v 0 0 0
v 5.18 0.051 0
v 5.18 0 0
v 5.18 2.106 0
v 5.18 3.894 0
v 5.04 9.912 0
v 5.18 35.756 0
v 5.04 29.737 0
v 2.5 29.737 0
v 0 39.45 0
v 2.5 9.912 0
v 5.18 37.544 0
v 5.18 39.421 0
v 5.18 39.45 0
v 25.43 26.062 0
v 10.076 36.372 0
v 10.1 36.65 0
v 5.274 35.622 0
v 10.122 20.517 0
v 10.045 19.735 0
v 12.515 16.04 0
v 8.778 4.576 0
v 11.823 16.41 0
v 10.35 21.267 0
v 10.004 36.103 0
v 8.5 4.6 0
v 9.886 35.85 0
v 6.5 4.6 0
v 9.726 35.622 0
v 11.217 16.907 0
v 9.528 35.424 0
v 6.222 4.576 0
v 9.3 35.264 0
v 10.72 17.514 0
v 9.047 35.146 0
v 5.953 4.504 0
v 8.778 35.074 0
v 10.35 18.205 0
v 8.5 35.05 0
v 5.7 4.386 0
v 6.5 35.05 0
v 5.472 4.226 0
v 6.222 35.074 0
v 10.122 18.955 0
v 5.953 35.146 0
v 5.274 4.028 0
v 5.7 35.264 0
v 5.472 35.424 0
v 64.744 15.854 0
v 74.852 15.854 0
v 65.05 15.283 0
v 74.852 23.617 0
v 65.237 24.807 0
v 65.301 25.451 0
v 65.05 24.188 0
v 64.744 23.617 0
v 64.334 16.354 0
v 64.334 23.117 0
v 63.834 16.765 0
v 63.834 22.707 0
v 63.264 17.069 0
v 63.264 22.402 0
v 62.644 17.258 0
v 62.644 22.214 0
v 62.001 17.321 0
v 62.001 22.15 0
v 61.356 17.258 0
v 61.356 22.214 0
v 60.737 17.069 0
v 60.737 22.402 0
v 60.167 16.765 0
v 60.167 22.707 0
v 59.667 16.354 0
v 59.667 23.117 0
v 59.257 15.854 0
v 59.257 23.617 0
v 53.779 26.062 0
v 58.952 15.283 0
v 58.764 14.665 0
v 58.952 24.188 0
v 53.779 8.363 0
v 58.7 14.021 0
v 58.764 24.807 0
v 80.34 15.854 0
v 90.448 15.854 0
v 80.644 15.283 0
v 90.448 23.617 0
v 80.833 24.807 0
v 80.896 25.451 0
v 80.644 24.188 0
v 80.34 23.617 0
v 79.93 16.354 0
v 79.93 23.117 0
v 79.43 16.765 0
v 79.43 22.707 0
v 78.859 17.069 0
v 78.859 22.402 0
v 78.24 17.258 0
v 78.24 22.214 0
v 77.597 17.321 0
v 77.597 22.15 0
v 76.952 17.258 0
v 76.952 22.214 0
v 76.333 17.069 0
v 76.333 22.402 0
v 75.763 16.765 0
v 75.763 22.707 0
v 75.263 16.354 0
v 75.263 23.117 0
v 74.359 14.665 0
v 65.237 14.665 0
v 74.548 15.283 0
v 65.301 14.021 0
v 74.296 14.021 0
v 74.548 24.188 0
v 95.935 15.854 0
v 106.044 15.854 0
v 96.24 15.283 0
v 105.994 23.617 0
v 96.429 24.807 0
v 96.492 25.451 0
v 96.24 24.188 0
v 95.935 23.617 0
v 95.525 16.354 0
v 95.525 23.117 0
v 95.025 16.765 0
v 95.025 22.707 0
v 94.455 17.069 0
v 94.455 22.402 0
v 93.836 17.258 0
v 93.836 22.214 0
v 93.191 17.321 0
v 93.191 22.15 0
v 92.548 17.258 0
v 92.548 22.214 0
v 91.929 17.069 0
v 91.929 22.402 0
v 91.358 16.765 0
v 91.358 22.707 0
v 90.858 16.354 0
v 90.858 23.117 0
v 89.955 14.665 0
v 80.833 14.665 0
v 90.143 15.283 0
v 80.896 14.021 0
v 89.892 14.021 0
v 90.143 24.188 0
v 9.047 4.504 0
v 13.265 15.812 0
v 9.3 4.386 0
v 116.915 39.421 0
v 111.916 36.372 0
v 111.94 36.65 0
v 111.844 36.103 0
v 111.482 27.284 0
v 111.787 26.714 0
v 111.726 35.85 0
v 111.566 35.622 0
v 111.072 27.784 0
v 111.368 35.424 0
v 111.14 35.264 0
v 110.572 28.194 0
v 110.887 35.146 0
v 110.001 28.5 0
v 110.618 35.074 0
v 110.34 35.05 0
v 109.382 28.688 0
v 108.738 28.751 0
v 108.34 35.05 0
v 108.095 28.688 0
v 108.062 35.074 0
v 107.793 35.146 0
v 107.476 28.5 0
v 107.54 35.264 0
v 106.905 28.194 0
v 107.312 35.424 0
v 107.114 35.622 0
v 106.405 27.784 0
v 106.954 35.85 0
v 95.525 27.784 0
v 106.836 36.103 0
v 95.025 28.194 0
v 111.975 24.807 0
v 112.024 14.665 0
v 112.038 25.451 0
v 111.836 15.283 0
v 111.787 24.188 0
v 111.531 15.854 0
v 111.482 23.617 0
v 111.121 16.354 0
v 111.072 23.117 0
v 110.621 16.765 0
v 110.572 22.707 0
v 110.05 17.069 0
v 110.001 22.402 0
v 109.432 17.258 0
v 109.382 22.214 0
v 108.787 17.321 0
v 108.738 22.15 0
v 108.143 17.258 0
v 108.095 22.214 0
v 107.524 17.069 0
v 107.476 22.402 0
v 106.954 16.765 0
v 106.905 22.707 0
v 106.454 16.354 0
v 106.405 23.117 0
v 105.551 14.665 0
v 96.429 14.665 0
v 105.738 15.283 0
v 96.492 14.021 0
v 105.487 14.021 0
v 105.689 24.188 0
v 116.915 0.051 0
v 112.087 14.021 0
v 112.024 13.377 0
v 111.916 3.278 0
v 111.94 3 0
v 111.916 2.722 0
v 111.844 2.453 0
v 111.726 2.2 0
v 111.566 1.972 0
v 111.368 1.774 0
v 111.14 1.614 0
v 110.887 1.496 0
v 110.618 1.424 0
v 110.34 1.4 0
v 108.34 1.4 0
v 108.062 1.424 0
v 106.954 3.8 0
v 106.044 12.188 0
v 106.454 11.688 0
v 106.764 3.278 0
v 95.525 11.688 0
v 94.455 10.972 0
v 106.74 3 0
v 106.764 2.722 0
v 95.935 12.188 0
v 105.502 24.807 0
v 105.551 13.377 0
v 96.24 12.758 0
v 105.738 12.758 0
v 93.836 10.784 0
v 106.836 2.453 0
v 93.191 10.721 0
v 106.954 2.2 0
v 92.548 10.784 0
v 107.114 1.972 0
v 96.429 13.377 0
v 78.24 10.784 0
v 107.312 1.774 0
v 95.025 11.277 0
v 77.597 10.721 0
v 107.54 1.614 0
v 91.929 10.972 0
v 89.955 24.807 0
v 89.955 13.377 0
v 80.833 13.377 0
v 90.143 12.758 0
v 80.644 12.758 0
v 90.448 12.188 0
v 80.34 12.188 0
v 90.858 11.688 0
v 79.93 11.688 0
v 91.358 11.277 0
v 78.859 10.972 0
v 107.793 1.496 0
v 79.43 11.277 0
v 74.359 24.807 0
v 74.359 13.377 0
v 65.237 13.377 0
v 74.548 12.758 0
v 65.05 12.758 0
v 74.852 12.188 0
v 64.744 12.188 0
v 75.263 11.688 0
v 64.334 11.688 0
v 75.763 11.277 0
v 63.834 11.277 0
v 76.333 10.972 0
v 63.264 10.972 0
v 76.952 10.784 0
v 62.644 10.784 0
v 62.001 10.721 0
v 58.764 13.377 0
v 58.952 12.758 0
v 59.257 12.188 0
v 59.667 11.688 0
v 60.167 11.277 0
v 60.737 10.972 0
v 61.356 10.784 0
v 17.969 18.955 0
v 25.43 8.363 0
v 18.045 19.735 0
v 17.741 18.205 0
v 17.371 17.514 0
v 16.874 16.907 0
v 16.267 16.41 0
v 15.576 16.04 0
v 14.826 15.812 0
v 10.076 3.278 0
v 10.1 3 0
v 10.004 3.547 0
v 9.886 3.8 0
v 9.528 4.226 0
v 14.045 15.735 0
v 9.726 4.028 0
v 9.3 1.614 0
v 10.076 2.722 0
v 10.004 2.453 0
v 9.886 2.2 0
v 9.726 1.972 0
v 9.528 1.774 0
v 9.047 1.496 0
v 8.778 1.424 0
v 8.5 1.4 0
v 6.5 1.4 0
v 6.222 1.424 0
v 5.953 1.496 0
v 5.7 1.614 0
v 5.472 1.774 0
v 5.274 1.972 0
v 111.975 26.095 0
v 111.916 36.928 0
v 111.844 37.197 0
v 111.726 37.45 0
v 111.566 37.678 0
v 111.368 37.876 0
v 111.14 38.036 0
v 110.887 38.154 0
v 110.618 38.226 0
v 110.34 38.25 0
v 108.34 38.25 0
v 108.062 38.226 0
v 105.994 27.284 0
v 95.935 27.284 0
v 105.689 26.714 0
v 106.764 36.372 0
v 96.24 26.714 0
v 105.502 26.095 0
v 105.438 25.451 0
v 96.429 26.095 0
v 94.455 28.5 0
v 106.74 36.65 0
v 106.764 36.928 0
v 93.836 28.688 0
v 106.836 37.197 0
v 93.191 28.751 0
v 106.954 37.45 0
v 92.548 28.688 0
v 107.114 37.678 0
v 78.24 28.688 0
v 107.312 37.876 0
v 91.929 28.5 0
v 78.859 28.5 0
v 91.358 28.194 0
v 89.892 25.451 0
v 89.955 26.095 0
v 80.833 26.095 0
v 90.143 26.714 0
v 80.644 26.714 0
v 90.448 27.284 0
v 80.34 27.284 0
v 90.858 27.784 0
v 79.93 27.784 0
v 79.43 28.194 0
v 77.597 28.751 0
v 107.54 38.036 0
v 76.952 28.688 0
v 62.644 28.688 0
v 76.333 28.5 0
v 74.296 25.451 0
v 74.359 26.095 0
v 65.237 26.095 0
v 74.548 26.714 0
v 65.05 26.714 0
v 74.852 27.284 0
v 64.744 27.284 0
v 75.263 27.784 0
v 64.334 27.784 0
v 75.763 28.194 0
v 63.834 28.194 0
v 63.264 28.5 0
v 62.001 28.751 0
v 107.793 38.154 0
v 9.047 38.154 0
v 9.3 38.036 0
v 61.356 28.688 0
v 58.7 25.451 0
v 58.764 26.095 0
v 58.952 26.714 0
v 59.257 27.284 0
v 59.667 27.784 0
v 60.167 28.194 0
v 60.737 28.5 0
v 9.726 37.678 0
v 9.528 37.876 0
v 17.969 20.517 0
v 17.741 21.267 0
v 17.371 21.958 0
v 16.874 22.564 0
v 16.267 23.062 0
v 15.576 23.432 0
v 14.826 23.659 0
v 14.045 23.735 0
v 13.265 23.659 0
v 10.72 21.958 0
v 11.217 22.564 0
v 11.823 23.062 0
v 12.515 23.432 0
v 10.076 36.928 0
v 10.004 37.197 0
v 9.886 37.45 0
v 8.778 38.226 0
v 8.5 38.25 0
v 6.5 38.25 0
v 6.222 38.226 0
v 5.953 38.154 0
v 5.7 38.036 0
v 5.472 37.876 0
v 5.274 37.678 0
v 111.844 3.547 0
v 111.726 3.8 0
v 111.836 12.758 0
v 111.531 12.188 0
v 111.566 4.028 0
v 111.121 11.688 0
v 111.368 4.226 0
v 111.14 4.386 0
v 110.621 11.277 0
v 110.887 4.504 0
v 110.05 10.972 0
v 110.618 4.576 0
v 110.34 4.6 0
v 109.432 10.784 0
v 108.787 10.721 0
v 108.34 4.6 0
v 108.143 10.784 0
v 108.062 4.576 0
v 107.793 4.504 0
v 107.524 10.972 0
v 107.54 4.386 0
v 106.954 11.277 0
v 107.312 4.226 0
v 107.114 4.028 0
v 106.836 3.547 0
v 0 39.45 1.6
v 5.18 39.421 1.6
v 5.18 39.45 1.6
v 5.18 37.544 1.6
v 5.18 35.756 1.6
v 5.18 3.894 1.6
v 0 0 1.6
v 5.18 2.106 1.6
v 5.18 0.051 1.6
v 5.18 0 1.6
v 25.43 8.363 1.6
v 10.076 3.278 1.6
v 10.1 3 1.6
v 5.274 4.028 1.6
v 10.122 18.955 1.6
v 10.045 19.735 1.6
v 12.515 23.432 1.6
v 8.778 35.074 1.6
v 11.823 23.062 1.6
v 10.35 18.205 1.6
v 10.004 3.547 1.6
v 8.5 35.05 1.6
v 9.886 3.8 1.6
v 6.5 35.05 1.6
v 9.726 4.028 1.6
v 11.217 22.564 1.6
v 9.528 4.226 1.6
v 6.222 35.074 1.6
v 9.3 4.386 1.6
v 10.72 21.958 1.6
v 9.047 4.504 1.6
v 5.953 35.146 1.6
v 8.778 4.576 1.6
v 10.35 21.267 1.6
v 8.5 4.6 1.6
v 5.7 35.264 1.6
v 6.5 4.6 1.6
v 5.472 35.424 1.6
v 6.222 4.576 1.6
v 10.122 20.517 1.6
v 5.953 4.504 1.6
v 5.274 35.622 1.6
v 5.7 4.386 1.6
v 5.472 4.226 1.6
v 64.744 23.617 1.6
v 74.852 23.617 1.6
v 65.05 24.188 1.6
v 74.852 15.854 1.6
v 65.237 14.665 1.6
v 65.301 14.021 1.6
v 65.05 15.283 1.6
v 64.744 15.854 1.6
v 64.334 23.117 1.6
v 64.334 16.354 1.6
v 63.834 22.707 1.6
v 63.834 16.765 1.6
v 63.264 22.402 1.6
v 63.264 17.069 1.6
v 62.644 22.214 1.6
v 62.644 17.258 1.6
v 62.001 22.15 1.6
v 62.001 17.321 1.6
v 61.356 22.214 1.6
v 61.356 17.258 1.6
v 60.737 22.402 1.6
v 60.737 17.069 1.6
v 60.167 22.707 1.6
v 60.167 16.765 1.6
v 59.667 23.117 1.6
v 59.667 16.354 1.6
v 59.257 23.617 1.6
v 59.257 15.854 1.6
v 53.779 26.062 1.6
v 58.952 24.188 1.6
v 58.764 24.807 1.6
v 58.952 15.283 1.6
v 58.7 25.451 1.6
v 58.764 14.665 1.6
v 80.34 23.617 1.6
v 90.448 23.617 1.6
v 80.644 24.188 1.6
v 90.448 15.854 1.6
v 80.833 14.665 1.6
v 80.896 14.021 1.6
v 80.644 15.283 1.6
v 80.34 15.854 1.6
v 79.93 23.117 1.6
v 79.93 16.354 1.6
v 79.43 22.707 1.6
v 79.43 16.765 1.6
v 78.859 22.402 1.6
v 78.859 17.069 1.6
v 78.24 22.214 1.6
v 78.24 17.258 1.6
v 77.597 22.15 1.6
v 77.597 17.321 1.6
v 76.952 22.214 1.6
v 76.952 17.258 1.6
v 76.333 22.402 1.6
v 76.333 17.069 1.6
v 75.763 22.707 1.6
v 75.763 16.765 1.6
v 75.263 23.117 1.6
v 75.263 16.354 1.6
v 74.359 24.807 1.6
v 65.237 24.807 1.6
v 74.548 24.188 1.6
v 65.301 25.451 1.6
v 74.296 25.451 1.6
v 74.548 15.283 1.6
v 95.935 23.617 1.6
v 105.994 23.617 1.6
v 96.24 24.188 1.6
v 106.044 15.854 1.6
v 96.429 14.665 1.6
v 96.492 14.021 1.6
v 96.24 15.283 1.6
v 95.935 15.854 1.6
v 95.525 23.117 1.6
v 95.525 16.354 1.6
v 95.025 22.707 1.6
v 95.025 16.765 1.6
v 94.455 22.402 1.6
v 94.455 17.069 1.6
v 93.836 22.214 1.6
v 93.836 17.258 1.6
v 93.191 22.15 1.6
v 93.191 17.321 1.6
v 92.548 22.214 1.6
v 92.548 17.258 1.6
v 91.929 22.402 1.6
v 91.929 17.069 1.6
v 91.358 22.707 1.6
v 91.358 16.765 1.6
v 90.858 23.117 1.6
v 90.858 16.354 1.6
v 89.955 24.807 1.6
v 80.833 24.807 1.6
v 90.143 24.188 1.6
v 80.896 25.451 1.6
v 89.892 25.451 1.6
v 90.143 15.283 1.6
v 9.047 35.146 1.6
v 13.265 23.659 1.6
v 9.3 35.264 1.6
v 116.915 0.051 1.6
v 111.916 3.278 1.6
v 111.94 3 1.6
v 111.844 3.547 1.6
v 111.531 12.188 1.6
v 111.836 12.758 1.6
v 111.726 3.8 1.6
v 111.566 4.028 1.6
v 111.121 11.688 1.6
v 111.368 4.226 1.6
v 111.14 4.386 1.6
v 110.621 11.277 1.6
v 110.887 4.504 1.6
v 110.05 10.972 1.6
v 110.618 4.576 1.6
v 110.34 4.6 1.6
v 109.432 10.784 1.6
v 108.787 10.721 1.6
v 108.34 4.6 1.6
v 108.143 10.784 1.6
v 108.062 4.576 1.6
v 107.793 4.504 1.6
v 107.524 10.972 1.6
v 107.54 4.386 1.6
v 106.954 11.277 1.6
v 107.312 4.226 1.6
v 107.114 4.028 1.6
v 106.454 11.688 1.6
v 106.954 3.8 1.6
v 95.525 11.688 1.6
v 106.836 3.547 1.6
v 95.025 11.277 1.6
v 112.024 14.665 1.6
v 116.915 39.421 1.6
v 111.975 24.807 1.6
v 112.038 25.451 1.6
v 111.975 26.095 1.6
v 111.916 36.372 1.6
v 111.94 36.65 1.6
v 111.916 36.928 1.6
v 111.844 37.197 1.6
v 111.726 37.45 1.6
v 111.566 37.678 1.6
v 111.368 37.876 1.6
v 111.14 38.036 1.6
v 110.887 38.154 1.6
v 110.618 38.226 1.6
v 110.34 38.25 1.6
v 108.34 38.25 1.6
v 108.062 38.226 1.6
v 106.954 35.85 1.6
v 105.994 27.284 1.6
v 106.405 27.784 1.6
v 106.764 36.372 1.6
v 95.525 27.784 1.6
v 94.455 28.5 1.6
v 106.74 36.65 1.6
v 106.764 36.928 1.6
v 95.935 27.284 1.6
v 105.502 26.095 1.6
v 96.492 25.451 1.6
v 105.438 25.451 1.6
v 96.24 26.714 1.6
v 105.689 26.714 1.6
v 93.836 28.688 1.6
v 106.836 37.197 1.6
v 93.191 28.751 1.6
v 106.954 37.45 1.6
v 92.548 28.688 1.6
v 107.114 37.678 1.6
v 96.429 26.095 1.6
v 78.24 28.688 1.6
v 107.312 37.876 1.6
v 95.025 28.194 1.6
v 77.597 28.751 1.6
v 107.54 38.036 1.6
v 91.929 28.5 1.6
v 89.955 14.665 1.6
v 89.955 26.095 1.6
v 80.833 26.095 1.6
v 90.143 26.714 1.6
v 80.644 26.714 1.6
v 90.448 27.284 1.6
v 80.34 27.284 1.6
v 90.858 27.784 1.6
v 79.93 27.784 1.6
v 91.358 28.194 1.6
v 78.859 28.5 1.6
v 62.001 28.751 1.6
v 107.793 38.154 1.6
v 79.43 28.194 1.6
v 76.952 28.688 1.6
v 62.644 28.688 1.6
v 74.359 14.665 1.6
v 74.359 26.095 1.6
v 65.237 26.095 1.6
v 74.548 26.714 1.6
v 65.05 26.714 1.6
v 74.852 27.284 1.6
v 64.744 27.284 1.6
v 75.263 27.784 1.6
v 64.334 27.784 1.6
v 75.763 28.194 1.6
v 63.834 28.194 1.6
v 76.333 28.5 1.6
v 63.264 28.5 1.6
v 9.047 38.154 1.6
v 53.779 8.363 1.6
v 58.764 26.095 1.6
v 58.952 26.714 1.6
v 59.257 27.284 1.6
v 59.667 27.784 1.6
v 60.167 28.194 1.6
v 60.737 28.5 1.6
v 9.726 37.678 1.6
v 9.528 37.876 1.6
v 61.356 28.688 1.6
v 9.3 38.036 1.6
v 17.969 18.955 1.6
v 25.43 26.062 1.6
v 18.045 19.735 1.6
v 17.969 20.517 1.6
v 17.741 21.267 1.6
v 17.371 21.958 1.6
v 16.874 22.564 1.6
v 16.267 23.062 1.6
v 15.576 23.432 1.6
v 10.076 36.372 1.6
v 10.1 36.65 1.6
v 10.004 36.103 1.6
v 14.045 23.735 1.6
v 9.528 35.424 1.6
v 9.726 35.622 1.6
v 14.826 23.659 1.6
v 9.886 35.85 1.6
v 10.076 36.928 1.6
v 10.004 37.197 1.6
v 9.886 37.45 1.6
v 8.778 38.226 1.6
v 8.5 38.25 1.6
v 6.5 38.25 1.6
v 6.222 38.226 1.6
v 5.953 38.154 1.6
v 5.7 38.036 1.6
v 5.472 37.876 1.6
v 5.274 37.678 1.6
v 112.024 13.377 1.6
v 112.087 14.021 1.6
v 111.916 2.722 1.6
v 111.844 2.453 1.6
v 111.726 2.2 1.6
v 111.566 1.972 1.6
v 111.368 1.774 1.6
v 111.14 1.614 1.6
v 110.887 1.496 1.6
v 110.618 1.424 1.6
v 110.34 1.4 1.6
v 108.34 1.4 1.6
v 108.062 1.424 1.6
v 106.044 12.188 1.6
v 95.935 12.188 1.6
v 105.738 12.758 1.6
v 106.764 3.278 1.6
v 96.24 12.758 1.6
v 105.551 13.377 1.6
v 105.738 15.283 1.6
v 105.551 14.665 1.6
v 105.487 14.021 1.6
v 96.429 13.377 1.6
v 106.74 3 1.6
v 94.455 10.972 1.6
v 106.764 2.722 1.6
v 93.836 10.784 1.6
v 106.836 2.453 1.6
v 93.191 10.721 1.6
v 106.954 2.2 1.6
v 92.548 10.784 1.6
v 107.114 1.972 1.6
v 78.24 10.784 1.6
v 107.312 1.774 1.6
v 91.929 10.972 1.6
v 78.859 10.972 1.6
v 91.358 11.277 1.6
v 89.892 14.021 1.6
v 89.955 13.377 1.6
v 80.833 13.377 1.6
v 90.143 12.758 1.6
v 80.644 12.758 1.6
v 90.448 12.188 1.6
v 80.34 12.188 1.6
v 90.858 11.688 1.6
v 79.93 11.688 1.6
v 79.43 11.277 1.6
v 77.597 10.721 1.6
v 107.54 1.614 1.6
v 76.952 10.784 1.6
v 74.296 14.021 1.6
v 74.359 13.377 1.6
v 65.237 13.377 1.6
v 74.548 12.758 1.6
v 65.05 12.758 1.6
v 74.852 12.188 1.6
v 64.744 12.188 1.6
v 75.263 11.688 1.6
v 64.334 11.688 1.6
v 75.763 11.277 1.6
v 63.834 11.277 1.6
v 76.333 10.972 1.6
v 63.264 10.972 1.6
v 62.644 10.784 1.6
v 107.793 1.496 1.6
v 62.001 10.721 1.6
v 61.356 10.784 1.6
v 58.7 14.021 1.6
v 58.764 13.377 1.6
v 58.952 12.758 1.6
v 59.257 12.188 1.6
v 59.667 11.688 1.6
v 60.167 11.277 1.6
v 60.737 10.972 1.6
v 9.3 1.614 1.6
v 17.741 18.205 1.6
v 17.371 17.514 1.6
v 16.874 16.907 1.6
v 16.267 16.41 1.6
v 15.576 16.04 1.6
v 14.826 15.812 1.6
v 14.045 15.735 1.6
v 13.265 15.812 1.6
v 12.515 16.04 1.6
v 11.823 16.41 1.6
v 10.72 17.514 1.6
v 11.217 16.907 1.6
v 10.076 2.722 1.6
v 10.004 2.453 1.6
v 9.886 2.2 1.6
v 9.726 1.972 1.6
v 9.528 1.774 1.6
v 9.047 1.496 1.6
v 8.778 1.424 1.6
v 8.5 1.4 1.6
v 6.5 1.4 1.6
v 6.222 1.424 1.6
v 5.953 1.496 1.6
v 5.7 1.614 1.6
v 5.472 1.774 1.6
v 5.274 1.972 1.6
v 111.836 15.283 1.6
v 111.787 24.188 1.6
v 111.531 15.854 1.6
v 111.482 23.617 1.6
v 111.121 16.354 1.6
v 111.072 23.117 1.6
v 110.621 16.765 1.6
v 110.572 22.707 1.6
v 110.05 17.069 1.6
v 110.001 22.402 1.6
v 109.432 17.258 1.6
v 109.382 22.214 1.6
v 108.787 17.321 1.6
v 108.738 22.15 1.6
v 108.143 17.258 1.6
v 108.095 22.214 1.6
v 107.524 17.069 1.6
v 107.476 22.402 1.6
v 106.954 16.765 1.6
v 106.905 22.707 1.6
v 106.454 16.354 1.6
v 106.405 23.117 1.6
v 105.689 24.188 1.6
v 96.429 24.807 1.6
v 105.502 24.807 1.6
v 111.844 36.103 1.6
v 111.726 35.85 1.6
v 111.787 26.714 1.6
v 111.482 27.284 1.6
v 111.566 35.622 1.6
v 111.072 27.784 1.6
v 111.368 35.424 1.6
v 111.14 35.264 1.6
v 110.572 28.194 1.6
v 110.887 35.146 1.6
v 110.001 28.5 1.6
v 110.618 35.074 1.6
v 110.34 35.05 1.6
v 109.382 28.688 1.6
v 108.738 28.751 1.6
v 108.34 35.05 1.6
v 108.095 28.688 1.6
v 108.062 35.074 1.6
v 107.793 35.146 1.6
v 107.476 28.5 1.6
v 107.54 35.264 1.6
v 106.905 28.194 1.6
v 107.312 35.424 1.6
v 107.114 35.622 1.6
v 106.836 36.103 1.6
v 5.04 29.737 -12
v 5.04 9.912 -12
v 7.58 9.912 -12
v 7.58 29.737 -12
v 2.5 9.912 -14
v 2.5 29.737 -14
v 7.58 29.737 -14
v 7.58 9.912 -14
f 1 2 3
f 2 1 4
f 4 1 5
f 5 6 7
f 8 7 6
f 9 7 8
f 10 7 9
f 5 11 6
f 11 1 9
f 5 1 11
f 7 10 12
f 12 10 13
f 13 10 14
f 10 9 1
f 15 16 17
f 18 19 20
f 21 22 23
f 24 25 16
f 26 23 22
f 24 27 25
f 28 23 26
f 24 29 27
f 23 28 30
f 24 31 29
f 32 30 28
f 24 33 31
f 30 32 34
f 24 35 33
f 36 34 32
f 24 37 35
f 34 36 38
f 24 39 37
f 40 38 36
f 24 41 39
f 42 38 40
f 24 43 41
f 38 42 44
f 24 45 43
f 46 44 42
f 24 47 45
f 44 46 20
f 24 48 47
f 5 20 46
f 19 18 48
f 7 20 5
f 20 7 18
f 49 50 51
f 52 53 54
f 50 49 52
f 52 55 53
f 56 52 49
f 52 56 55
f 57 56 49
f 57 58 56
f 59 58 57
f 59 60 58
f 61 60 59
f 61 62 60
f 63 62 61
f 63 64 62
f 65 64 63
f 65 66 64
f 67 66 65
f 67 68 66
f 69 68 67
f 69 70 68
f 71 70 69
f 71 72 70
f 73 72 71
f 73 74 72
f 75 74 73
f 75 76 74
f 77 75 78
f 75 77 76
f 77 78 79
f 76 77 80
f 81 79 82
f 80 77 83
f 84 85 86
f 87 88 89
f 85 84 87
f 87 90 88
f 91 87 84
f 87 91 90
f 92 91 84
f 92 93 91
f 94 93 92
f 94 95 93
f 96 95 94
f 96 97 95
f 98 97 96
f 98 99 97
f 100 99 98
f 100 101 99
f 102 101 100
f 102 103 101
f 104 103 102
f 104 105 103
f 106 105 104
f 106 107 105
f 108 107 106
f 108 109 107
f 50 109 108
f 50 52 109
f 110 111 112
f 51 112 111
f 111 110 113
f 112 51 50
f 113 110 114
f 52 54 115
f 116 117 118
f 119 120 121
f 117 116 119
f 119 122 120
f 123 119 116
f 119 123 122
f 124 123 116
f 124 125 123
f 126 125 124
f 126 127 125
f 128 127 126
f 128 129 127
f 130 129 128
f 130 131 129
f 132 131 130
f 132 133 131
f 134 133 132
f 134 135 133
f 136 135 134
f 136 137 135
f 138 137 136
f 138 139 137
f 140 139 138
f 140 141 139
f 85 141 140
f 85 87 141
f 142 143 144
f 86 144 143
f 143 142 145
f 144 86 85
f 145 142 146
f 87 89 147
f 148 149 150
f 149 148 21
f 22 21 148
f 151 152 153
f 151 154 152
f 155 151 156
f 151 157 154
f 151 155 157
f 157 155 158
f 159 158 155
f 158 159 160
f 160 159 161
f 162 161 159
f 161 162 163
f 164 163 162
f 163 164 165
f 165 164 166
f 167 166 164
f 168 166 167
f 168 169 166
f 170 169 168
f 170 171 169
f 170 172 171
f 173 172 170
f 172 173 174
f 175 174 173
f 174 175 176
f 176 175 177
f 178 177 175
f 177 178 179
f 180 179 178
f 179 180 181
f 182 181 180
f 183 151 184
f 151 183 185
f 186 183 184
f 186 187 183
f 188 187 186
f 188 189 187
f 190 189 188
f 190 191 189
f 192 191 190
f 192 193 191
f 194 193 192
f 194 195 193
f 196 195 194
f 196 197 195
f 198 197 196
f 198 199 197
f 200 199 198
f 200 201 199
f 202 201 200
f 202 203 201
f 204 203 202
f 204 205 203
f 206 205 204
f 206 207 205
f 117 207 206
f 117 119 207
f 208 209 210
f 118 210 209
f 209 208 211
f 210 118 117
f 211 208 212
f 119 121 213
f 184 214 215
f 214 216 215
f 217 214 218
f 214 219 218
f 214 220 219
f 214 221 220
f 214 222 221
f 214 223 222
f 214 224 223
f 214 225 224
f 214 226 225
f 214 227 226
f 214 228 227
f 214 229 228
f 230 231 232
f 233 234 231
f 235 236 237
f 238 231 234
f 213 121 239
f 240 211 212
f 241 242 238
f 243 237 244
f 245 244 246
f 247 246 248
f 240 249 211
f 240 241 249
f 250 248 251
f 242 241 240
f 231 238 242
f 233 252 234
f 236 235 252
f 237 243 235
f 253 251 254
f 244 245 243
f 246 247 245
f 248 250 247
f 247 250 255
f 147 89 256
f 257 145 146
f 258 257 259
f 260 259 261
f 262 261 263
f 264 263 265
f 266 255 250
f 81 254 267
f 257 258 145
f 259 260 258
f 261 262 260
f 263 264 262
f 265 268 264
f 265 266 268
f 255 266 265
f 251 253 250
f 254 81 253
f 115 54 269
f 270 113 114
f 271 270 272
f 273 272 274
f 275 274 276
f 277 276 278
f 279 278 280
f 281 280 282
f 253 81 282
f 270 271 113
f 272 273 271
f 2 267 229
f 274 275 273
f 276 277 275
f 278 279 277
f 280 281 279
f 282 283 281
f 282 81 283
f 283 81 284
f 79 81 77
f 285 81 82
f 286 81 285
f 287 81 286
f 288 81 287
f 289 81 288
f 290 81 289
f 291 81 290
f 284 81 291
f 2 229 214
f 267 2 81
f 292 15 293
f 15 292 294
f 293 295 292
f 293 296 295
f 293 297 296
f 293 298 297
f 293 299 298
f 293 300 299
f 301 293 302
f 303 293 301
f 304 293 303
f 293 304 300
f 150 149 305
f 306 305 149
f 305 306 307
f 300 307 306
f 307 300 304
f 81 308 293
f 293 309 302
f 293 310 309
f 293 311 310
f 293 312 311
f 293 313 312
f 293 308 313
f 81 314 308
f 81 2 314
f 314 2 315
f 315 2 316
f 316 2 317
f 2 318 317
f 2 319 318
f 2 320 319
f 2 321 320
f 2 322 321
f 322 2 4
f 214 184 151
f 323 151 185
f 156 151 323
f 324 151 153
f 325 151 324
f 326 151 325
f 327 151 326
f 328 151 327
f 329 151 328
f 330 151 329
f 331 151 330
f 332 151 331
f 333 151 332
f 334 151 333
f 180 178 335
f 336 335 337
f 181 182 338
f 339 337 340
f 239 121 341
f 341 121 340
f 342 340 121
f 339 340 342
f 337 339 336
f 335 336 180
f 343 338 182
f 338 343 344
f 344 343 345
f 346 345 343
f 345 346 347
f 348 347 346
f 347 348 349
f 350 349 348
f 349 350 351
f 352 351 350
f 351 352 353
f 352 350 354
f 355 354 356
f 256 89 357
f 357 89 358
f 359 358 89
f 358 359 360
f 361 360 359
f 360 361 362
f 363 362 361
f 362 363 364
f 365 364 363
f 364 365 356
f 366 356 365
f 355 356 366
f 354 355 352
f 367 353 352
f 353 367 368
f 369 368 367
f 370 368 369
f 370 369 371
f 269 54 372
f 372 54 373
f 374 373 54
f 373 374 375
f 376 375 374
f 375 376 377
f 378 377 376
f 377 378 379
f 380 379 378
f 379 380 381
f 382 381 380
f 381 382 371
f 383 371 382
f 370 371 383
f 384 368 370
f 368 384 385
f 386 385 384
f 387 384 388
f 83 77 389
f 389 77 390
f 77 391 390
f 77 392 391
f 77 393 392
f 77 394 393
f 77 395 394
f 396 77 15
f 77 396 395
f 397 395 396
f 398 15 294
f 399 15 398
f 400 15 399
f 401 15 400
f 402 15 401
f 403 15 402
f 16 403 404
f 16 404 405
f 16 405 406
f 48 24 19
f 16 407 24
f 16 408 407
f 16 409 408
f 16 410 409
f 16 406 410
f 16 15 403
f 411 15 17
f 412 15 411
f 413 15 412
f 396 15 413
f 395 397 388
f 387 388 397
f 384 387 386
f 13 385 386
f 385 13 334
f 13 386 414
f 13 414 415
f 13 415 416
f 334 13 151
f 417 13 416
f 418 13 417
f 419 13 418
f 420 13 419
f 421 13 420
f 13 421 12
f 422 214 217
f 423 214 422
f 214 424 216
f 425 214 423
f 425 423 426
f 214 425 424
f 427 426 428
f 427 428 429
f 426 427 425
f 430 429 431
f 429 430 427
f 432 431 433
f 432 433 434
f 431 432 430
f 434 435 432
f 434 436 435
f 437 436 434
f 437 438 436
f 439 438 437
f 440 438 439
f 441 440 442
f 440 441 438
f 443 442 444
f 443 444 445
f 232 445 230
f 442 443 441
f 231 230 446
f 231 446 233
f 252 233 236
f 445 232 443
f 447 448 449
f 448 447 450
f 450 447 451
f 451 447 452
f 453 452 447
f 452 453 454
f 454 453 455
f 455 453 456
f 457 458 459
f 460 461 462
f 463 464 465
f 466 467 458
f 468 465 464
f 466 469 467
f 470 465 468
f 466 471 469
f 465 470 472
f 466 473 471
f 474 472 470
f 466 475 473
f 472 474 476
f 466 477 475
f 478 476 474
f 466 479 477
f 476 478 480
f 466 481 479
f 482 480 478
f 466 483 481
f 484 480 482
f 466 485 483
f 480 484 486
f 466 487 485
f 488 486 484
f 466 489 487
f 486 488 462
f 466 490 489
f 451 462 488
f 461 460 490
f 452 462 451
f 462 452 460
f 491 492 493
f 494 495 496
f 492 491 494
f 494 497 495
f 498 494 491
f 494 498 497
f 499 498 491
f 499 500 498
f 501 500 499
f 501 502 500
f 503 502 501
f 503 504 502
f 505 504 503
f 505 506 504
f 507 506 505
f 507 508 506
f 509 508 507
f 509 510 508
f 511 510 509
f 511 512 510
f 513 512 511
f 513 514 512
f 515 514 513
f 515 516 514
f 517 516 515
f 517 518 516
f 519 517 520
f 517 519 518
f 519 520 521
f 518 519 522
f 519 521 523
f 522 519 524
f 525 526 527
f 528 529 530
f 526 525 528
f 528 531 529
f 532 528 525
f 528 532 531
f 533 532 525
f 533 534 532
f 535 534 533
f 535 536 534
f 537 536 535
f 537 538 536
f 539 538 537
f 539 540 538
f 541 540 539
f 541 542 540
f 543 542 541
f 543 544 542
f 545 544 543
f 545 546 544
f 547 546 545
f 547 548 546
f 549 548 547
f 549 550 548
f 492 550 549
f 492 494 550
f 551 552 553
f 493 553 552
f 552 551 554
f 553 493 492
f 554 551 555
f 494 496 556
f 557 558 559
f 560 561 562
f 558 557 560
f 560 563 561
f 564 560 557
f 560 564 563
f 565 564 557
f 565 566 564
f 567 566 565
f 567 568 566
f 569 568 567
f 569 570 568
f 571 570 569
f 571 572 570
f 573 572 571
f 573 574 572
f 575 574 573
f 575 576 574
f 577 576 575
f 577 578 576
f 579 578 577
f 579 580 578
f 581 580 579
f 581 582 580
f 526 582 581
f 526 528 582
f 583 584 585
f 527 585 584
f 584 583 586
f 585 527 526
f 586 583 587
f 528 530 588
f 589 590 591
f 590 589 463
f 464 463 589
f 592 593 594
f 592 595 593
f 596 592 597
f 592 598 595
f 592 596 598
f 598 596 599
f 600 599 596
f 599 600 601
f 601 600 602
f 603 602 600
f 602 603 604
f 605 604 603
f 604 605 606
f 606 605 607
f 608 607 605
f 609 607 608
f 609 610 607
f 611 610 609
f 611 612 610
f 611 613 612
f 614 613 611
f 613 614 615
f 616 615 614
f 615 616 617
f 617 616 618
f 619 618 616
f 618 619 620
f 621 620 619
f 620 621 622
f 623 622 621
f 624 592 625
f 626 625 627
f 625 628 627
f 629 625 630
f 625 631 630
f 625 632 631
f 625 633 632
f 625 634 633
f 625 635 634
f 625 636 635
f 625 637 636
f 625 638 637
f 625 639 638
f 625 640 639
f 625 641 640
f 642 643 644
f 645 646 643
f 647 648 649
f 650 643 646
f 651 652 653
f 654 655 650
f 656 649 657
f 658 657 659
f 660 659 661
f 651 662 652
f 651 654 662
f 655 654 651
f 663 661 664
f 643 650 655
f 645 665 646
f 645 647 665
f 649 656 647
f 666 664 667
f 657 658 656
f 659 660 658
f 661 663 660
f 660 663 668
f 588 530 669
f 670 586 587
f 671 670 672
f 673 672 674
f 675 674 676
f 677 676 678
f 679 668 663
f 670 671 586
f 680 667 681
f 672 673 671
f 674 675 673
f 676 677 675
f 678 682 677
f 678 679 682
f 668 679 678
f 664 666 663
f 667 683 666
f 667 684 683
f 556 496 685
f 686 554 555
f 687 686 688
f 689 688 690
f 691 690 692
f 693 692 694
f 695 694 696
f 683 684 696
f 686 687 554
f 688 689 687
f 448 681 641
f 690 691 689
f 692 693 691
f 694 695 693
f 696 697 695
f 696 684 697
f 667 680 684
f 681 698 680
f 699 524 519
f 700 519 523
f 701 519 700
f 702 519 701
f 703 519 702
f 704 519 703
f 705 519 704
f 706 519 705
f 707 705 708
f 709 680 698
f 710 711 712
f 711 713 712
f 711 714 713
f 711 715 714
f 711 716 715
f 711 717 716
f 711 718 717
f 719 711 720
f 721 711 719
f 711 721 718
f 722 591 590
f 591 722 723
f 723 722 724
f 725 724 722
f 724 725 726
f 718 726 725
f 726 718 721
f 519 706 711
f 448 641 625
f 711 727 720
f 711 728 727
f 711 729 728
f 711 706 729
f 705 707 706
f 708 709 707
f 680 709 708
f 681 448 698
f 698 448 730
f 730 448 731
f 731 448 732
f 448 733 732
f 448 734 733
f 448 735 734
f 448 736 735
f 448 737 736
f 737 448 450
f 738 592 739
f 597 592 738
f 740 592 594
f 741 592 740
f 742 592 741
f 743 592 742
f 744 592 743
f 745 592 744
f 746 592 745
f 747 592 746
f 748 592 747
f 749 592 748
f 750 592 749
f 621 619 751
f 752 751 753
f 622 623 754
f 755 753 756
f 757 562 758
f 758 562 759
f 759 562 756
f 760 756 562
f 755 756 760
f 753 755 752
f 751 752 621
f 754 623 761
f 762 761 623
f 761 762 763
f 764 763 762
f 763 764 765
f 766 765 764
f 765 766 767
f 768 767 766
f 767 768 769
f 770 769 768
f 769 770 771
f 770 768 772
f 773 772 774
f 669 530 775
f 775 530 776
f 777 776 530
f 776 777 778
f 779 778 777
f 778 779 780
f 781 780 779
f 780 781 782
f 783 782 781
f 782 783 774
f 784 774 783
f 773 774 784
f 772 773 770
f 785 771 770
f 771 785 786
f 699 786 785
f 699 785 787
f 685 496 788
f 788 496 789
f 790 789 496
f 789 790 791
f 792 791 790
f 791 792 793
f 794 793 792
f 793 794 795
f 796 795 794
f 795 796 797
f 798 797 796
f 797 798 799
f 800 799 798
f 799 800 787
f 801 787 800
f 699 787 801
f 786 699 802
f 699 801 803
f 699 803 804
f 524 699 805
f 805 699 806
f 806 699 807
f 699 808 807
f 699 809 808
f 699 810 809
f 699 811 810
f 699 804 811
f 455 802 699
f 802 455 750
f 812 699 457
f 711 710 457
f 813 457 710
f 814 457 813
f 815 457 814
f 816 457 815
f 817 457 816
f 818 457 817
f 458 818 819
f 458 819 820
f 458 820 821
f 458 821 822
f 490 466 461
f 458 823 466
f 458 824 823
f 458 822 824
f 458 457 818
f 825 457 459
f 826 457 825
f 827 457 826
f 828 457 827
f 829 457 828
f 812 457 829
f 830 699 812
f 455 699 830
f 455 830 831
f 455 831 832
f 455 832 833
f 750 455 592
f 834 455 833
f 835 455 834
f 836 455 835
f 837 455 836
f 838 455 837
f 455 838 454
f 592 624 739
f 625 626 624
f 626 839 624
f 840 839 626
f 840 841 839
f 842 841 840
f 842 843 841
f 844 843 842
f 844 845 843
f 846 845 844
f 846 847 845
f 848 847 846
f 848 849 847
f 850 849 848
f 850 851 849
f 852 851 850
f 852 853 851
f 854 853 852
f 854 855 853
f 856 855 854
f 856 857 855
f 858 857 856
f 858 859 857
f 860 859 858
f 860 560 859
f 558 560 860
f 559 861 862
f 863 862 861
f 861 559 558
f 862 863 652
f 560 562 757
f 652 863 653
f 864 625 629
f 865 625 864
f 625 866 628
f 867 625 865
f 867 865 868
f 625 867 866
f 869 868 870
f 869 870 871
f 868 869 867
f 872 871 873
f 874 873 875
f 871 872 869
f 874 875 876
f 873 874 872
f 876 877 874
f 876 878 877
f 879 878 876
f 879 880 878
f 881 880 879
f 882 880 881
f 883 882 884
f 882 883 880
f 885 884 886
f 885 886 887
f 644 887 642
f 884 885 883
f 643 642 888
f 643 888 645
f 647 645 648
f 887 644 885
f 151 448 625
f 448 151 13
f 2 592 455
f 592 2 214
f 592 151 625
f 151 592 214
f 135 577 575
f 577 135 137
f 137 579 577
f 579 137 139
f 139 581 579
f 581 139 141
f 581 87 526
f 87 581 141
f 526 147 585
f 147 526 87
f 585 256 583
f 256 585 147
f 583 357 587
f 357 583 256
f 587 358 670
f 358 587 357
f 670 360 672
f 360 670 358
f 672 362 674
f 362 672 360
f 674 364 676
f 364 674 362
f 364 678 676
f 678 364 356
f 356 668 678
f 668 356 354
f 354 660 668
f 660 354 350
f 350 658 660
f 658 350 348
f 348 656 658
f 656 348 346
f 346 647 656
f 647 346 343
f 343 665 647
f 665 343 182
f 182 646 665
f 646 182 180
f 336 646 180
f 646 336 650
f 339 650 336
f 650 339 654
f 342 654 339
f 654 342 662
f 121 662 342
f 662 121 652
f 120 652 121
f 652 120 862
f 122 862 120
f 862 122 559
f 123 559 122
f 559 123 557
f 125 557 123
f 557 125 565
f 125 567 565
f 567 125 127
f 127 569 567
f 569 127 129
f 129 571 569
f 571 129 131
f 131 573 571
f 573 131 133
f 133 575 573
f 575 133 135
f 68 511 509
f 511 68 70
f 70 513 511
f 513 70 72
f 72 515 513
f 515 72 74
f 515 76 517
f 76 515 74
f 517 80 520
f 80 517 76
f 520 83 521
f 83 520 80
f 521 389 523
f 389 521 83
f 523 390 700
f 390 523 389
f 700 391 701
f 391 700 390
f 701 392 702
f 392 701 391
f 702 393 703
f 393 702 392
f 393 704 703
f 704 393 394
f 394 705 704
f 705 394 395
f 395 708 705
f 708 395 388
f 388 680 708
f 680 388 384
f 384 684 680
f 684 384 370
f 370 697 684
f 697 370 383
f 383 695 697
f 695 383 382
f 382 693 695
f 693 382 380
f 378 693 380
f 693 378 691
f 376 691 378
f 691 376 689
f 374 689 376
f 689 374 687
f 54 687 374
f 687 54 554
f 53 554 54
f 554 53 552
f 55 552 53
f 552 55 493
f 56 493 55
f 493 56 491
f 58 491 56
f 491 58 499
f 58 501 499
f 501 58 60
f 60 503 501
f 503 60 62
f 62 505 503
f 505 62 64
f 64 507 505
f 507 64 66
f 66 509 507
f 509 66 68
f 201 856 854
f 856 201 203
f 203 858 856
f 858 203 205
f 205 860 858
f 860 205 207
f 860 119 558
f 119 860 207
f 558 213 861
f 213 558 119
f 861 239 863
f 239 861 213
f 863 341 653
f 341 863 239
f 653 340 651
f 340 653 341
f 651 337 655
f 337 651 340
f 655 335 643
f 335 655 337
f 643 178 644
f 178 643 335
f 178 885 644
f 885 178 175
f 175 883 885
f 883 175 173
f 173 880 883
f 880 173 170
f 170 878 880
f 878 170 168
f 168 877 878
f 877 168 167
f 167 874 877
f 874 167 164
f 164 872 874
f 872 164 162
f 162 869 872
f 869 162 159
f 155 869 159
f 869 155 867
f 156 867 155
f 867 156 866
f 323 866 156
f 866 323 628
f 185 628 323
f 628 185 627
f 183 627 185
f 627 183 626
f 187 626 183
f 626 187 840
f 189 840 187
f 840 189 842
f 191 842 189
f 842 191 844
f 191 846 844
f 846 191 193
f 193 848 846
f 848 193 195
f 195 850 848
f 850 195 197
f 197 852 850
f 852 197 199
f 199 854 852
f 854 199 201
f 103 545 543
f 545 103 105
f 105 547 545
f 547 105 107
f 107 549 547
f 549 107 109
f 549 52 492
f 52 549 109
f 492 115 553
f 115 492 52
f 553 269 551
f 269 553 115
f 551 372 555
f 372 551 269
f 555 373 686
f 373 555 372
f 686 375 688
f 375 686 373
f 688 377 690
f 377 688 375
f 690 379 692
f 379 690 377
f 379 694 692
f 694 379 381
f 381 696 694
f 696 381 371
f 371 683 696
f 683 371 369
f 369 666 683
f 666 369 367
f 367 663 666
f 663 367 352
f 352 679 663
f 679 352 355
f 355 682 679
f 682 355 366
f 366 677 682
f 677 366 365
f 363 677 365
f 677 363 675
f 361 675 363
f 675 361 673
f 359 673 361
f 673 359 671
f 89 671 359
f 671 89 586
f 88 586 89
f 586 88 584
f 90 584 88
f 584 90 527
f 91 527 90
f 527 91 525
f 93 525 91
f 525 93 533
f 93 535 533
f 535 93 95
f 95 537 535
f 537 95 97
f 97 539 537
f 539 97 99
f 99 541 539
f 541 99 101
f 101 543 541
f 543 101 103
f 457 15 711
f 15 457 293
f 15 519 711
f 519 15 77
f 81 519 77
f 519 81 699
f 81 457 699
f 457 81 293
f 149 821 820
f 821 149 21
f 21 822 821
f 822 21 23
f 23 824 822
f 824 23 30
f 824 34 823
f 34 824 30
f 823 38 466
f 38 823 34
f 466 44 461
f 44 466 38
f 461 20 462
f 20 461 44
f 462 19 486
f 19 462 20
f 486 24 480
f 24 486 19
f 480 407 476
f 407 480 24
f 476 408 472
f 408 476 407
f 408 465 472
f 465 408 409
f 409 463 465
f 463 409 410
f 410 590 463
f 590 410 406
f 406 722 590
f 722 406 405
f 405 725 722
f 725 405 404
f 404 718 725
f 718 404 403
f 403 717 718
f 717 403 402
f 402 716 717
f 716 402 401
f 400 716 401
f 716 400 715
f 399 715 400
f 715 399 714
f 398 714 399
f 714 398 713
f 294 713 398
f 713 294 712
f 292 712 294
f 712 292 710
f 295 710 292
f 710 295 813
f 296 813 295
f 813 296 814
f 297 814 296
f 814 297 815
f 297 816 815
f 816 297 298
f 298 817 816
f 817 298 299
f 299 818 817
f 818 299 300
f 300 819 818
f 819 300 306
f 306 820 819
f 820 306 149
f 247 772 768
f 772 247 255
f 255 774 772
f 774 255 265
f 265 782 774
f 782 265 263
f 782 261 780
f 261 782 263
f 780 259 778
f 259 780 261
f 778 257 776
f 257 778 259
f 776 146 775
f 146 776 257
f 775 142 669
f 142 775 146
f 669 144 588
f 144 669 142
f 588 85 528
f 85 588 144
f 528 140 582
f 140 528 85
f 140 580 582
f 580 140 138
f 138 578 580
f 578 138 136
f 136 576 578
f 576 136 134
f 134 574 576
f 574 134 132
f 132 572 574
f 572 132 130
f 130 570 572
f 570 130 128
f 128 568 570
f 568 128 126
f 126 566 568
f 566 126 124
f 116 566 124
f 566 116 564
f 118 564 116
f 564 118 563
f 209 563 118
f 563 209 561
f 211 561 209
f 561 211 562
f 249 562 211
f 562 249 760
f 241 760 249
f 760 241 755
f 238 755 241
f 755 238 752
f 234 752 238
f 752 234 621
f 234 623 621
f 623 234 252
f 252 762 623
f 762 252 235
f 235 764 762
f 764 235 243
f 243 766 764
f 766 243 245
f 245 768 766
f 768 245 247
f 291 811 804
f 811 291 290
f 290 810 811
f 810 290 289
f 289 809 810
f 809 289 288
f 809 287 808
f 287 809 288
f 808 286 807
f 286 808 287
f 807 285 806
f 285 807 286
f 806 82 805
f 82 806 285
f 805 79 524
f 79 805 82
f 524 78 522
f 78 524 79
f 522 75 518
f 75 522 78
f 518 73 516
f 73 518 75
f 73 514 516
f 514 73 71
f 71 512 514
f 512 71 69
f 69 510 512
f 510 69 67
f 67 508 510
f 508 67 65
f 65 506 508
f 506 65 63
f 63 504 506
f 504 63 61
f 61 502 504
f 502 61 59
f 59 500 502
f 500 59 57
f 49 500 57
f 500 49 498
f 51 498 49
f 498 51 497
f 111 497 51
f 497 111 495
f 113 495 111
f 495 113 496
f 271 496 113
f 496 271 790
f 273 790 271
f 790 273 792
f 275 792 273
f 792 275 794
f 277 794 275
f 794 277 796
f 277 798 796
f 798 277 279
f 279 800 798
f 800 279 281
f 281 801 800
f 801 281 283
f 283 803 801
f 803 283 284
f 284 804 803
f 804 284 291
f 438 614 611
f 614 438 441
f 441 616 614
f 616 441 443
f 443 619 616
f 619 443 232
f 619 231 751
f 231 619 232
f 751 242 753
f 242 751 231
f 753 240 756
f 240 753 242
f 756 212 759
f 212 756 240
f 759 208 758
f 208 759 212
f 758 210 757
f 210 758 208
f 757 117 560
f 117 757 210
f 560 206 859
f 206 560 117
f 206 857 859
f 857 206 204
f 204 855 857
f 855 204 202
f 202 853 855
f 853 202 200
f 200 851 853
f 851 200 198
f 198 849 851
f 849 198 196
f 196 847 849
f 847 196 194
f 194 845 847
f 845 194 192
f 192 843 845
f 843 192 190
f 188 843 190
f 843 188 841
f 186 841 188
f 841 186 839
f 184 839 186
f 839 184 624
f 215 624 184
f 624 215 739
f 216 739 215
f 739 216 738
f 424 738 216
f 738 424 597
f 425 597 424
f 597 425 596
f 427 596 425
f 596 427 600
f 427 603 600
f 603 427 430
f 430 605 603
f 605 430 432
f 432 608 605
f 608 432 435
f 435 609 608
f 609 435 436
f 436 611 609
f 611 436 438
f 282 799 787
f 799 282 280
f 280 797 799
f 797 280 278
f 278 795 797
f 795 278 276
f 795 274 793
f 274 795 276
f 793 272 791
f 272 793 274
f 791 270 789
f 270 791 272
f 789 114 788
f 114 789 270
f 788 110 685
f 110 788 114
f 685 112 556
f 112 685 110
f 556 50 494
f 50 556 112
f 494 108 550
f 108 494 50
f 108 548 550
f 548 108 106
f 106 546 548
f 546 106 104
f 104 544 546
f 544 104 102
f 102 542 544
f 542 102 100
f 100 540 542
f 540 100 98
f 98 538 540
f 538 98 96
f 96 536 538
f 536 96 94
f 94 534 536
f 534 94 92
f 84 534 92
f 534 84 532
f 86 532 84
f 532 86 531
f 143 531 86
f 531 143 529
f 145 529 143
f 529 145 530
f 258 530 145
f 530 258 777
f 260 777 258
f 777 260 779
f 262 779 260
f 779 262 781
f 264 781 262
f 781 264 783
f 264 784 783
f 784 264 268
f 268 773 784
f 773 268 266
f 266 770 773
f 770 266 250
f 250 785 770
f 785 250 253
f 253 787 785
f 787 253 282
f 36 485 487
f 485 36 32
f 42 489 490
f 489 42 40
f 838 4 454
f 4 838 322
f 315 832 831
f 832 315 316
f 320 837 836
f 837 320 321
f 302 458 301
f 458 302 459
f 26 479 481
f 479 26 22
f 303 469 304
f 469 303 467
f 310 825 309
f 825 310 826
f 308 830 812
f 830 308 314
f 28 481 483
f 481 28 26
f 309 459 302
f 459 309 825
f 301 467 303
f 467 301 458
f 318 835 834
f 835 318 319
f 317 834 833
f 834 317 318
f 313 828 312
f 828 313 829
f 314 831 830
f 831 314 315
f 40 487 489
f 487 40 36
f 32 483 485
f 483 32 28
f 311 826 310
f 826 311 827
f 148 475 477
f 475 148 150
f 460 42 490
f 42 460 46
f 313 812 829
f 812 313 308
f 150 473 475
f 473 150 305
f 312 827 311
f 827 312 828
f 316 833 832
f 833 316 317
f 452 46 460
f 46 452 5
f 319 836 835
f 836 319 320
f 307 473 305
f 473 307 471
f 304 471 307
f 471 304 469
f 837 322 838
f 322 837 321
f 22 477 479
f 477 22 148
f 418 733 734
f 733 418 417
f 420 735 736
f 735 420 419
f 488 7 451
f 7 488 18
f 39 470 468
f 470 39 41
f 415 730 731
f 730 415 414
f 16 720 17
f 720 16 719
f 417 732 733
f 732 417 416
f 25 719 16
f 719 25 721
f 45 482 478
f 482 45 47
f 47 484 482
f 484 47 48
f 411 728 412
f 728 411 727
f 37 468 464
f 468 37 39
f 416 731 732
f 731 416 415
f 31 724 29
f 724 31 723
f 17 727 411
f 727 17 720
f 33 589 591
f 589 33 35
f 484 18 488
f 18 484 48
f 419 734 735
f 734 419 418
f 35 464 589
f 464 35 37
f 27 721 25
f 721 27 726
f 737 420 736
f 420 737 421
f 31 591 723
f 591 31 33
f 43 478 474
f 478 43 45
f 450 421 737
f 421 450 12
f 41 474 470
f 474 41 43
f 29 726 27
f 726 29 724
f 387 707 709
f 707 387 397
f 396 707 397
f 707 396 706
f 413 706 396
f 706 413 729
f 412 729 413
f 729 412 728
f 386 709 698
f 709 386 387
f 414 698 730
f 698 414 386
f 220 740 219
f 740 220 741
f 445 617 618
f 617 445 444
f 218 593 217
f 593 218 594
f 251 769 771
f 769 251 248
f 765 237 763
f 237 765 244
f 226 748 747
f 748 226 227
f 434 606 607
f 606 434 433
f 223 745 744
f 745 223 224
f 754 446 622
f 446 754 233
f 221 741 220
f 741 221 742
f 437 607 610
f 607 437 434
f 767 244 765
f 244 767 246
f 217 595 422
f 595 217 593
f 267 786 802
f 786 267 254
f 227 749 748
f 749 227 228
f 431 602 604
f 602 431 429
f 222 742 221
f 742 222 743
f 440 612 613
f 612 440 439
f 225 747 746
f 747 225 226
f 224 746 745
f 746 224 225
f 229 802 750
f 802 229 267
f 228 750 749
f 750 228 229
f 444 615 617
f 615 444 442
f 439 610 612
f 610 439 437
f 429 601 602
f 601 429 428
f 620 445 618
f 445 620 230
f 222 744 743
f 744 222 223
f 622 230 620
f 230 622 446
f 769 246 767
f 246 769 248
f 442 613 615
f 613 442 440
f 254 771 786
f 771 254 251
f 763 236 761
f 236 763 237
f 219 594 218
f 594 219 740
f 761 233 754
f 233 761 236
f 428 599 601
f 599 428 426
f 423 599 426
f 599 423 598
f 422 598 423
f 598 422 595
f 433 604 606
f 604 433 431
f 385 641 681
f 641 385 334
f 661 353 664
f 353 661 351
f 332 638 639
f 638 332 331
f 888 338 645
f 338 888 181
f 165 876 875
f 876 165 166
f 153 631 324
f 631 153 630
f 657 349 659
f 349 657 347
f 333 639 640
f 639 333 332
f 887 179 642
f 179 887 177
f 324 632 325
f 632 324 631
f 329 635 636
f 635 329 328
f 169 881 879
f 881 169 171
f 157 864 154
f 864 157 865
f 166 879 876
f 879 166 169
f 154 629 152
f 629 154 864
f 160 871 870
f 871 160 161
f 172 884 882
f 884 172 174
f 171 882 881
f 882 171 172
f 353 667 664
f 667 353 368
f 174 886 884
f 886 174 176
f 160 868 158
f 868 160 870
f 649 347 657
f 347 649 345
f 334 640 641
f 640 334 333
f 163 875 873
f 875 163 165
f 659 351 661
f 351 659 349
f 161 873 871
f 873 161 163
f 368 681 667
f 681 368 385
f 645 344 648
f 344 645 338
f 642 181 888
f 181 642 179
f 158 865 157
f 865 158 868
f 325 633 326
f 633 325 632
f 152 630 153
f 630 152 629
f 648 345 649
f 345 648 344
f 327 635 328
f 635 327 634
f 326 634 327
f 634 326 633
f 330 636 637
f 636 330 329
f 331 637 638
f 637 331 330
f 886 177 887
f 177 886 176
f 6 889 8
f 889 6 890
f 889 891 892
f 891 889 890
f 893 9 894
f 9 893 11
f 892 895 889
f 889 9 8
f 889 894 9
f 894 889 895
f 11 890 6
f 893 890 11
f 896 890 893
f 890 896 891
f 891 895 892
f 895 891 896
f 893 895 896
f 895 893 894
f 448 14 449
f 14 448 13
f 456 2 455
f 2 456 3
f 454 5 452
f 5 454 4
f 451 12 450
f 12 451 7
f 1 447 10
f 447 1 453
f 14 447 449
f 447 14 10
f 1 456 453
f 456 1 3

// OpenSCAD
_DELTA = 0.01;

ONE_HP = 0.2*25.4;
ONE_U  = 39.65;
// approximately equal to a standard PCB thickness
THICKNESS = 1.6;
MODULE_WIDTH = 23*ONE_HP;

// the main facade body
//   Process: plot User Drawings layer from KiCAD (contains outline
//     and holes for jacks, encoders, etc). Open that in Inkscape,
//     process circles using "Object->Object to Path", then select path,
//     process using "Segments to lines", then save as R14 DXF to import here.
module main() {
    linear_extrude(height=THICKNESS)
        import(file="drawing.dxf");
}

module mounting_hole(x_offset=0, y_offset=0) {
    $fn = 36;
    MOUNTING_HOLE_DIAMETER = 3.2;
    translate([x_offset, y_offset, THICKNESS/2])
        hull() {
            translate([-1, 0, 0])
                cylinder(THICKNESS+_DELTA, MOUNTING_HOLE_DIAMETER/2, MOUNTING_HOLE_DIAMETER/2, center=true);
            translate([1, 0, 0])
                cylinder(THICKNESS+_DELTA, MOUNTING_HOLE_DIAMETER/2, MOUNTING_HOLE_DIAMETER/2, center=true);
        }
}

module three() {
    
}

difference() {  
    translate([1*ONE_HP, 0, 0])
        main();
    mounting_hole(7.5, 3);
    mounting_hole(7.5, ONE_U-3);
    mounting_hole(MODULE_WIDTH-7.5, 3);
    mounting_hole(MODULE_WIDTH-7.5, ONE_U-3);
}

// extra space to add support
cube([ONE_HP+10*_DELTA, ONE_U-0.2, THICKNESS]);
translate([2.5, 0, 0]) {
    // support
    support_height = 12;
    translate([ONE_HP/4, ONE_U/2, -support_height/2])
        cube([ONE_HP/2, ONE_U/2, support_height], center=true);
    translate([ONE_HP/2, ONE_U/2, -support_height-1])
        cube([ONE_HP, ONE_U/2, 2], center=true);
}
